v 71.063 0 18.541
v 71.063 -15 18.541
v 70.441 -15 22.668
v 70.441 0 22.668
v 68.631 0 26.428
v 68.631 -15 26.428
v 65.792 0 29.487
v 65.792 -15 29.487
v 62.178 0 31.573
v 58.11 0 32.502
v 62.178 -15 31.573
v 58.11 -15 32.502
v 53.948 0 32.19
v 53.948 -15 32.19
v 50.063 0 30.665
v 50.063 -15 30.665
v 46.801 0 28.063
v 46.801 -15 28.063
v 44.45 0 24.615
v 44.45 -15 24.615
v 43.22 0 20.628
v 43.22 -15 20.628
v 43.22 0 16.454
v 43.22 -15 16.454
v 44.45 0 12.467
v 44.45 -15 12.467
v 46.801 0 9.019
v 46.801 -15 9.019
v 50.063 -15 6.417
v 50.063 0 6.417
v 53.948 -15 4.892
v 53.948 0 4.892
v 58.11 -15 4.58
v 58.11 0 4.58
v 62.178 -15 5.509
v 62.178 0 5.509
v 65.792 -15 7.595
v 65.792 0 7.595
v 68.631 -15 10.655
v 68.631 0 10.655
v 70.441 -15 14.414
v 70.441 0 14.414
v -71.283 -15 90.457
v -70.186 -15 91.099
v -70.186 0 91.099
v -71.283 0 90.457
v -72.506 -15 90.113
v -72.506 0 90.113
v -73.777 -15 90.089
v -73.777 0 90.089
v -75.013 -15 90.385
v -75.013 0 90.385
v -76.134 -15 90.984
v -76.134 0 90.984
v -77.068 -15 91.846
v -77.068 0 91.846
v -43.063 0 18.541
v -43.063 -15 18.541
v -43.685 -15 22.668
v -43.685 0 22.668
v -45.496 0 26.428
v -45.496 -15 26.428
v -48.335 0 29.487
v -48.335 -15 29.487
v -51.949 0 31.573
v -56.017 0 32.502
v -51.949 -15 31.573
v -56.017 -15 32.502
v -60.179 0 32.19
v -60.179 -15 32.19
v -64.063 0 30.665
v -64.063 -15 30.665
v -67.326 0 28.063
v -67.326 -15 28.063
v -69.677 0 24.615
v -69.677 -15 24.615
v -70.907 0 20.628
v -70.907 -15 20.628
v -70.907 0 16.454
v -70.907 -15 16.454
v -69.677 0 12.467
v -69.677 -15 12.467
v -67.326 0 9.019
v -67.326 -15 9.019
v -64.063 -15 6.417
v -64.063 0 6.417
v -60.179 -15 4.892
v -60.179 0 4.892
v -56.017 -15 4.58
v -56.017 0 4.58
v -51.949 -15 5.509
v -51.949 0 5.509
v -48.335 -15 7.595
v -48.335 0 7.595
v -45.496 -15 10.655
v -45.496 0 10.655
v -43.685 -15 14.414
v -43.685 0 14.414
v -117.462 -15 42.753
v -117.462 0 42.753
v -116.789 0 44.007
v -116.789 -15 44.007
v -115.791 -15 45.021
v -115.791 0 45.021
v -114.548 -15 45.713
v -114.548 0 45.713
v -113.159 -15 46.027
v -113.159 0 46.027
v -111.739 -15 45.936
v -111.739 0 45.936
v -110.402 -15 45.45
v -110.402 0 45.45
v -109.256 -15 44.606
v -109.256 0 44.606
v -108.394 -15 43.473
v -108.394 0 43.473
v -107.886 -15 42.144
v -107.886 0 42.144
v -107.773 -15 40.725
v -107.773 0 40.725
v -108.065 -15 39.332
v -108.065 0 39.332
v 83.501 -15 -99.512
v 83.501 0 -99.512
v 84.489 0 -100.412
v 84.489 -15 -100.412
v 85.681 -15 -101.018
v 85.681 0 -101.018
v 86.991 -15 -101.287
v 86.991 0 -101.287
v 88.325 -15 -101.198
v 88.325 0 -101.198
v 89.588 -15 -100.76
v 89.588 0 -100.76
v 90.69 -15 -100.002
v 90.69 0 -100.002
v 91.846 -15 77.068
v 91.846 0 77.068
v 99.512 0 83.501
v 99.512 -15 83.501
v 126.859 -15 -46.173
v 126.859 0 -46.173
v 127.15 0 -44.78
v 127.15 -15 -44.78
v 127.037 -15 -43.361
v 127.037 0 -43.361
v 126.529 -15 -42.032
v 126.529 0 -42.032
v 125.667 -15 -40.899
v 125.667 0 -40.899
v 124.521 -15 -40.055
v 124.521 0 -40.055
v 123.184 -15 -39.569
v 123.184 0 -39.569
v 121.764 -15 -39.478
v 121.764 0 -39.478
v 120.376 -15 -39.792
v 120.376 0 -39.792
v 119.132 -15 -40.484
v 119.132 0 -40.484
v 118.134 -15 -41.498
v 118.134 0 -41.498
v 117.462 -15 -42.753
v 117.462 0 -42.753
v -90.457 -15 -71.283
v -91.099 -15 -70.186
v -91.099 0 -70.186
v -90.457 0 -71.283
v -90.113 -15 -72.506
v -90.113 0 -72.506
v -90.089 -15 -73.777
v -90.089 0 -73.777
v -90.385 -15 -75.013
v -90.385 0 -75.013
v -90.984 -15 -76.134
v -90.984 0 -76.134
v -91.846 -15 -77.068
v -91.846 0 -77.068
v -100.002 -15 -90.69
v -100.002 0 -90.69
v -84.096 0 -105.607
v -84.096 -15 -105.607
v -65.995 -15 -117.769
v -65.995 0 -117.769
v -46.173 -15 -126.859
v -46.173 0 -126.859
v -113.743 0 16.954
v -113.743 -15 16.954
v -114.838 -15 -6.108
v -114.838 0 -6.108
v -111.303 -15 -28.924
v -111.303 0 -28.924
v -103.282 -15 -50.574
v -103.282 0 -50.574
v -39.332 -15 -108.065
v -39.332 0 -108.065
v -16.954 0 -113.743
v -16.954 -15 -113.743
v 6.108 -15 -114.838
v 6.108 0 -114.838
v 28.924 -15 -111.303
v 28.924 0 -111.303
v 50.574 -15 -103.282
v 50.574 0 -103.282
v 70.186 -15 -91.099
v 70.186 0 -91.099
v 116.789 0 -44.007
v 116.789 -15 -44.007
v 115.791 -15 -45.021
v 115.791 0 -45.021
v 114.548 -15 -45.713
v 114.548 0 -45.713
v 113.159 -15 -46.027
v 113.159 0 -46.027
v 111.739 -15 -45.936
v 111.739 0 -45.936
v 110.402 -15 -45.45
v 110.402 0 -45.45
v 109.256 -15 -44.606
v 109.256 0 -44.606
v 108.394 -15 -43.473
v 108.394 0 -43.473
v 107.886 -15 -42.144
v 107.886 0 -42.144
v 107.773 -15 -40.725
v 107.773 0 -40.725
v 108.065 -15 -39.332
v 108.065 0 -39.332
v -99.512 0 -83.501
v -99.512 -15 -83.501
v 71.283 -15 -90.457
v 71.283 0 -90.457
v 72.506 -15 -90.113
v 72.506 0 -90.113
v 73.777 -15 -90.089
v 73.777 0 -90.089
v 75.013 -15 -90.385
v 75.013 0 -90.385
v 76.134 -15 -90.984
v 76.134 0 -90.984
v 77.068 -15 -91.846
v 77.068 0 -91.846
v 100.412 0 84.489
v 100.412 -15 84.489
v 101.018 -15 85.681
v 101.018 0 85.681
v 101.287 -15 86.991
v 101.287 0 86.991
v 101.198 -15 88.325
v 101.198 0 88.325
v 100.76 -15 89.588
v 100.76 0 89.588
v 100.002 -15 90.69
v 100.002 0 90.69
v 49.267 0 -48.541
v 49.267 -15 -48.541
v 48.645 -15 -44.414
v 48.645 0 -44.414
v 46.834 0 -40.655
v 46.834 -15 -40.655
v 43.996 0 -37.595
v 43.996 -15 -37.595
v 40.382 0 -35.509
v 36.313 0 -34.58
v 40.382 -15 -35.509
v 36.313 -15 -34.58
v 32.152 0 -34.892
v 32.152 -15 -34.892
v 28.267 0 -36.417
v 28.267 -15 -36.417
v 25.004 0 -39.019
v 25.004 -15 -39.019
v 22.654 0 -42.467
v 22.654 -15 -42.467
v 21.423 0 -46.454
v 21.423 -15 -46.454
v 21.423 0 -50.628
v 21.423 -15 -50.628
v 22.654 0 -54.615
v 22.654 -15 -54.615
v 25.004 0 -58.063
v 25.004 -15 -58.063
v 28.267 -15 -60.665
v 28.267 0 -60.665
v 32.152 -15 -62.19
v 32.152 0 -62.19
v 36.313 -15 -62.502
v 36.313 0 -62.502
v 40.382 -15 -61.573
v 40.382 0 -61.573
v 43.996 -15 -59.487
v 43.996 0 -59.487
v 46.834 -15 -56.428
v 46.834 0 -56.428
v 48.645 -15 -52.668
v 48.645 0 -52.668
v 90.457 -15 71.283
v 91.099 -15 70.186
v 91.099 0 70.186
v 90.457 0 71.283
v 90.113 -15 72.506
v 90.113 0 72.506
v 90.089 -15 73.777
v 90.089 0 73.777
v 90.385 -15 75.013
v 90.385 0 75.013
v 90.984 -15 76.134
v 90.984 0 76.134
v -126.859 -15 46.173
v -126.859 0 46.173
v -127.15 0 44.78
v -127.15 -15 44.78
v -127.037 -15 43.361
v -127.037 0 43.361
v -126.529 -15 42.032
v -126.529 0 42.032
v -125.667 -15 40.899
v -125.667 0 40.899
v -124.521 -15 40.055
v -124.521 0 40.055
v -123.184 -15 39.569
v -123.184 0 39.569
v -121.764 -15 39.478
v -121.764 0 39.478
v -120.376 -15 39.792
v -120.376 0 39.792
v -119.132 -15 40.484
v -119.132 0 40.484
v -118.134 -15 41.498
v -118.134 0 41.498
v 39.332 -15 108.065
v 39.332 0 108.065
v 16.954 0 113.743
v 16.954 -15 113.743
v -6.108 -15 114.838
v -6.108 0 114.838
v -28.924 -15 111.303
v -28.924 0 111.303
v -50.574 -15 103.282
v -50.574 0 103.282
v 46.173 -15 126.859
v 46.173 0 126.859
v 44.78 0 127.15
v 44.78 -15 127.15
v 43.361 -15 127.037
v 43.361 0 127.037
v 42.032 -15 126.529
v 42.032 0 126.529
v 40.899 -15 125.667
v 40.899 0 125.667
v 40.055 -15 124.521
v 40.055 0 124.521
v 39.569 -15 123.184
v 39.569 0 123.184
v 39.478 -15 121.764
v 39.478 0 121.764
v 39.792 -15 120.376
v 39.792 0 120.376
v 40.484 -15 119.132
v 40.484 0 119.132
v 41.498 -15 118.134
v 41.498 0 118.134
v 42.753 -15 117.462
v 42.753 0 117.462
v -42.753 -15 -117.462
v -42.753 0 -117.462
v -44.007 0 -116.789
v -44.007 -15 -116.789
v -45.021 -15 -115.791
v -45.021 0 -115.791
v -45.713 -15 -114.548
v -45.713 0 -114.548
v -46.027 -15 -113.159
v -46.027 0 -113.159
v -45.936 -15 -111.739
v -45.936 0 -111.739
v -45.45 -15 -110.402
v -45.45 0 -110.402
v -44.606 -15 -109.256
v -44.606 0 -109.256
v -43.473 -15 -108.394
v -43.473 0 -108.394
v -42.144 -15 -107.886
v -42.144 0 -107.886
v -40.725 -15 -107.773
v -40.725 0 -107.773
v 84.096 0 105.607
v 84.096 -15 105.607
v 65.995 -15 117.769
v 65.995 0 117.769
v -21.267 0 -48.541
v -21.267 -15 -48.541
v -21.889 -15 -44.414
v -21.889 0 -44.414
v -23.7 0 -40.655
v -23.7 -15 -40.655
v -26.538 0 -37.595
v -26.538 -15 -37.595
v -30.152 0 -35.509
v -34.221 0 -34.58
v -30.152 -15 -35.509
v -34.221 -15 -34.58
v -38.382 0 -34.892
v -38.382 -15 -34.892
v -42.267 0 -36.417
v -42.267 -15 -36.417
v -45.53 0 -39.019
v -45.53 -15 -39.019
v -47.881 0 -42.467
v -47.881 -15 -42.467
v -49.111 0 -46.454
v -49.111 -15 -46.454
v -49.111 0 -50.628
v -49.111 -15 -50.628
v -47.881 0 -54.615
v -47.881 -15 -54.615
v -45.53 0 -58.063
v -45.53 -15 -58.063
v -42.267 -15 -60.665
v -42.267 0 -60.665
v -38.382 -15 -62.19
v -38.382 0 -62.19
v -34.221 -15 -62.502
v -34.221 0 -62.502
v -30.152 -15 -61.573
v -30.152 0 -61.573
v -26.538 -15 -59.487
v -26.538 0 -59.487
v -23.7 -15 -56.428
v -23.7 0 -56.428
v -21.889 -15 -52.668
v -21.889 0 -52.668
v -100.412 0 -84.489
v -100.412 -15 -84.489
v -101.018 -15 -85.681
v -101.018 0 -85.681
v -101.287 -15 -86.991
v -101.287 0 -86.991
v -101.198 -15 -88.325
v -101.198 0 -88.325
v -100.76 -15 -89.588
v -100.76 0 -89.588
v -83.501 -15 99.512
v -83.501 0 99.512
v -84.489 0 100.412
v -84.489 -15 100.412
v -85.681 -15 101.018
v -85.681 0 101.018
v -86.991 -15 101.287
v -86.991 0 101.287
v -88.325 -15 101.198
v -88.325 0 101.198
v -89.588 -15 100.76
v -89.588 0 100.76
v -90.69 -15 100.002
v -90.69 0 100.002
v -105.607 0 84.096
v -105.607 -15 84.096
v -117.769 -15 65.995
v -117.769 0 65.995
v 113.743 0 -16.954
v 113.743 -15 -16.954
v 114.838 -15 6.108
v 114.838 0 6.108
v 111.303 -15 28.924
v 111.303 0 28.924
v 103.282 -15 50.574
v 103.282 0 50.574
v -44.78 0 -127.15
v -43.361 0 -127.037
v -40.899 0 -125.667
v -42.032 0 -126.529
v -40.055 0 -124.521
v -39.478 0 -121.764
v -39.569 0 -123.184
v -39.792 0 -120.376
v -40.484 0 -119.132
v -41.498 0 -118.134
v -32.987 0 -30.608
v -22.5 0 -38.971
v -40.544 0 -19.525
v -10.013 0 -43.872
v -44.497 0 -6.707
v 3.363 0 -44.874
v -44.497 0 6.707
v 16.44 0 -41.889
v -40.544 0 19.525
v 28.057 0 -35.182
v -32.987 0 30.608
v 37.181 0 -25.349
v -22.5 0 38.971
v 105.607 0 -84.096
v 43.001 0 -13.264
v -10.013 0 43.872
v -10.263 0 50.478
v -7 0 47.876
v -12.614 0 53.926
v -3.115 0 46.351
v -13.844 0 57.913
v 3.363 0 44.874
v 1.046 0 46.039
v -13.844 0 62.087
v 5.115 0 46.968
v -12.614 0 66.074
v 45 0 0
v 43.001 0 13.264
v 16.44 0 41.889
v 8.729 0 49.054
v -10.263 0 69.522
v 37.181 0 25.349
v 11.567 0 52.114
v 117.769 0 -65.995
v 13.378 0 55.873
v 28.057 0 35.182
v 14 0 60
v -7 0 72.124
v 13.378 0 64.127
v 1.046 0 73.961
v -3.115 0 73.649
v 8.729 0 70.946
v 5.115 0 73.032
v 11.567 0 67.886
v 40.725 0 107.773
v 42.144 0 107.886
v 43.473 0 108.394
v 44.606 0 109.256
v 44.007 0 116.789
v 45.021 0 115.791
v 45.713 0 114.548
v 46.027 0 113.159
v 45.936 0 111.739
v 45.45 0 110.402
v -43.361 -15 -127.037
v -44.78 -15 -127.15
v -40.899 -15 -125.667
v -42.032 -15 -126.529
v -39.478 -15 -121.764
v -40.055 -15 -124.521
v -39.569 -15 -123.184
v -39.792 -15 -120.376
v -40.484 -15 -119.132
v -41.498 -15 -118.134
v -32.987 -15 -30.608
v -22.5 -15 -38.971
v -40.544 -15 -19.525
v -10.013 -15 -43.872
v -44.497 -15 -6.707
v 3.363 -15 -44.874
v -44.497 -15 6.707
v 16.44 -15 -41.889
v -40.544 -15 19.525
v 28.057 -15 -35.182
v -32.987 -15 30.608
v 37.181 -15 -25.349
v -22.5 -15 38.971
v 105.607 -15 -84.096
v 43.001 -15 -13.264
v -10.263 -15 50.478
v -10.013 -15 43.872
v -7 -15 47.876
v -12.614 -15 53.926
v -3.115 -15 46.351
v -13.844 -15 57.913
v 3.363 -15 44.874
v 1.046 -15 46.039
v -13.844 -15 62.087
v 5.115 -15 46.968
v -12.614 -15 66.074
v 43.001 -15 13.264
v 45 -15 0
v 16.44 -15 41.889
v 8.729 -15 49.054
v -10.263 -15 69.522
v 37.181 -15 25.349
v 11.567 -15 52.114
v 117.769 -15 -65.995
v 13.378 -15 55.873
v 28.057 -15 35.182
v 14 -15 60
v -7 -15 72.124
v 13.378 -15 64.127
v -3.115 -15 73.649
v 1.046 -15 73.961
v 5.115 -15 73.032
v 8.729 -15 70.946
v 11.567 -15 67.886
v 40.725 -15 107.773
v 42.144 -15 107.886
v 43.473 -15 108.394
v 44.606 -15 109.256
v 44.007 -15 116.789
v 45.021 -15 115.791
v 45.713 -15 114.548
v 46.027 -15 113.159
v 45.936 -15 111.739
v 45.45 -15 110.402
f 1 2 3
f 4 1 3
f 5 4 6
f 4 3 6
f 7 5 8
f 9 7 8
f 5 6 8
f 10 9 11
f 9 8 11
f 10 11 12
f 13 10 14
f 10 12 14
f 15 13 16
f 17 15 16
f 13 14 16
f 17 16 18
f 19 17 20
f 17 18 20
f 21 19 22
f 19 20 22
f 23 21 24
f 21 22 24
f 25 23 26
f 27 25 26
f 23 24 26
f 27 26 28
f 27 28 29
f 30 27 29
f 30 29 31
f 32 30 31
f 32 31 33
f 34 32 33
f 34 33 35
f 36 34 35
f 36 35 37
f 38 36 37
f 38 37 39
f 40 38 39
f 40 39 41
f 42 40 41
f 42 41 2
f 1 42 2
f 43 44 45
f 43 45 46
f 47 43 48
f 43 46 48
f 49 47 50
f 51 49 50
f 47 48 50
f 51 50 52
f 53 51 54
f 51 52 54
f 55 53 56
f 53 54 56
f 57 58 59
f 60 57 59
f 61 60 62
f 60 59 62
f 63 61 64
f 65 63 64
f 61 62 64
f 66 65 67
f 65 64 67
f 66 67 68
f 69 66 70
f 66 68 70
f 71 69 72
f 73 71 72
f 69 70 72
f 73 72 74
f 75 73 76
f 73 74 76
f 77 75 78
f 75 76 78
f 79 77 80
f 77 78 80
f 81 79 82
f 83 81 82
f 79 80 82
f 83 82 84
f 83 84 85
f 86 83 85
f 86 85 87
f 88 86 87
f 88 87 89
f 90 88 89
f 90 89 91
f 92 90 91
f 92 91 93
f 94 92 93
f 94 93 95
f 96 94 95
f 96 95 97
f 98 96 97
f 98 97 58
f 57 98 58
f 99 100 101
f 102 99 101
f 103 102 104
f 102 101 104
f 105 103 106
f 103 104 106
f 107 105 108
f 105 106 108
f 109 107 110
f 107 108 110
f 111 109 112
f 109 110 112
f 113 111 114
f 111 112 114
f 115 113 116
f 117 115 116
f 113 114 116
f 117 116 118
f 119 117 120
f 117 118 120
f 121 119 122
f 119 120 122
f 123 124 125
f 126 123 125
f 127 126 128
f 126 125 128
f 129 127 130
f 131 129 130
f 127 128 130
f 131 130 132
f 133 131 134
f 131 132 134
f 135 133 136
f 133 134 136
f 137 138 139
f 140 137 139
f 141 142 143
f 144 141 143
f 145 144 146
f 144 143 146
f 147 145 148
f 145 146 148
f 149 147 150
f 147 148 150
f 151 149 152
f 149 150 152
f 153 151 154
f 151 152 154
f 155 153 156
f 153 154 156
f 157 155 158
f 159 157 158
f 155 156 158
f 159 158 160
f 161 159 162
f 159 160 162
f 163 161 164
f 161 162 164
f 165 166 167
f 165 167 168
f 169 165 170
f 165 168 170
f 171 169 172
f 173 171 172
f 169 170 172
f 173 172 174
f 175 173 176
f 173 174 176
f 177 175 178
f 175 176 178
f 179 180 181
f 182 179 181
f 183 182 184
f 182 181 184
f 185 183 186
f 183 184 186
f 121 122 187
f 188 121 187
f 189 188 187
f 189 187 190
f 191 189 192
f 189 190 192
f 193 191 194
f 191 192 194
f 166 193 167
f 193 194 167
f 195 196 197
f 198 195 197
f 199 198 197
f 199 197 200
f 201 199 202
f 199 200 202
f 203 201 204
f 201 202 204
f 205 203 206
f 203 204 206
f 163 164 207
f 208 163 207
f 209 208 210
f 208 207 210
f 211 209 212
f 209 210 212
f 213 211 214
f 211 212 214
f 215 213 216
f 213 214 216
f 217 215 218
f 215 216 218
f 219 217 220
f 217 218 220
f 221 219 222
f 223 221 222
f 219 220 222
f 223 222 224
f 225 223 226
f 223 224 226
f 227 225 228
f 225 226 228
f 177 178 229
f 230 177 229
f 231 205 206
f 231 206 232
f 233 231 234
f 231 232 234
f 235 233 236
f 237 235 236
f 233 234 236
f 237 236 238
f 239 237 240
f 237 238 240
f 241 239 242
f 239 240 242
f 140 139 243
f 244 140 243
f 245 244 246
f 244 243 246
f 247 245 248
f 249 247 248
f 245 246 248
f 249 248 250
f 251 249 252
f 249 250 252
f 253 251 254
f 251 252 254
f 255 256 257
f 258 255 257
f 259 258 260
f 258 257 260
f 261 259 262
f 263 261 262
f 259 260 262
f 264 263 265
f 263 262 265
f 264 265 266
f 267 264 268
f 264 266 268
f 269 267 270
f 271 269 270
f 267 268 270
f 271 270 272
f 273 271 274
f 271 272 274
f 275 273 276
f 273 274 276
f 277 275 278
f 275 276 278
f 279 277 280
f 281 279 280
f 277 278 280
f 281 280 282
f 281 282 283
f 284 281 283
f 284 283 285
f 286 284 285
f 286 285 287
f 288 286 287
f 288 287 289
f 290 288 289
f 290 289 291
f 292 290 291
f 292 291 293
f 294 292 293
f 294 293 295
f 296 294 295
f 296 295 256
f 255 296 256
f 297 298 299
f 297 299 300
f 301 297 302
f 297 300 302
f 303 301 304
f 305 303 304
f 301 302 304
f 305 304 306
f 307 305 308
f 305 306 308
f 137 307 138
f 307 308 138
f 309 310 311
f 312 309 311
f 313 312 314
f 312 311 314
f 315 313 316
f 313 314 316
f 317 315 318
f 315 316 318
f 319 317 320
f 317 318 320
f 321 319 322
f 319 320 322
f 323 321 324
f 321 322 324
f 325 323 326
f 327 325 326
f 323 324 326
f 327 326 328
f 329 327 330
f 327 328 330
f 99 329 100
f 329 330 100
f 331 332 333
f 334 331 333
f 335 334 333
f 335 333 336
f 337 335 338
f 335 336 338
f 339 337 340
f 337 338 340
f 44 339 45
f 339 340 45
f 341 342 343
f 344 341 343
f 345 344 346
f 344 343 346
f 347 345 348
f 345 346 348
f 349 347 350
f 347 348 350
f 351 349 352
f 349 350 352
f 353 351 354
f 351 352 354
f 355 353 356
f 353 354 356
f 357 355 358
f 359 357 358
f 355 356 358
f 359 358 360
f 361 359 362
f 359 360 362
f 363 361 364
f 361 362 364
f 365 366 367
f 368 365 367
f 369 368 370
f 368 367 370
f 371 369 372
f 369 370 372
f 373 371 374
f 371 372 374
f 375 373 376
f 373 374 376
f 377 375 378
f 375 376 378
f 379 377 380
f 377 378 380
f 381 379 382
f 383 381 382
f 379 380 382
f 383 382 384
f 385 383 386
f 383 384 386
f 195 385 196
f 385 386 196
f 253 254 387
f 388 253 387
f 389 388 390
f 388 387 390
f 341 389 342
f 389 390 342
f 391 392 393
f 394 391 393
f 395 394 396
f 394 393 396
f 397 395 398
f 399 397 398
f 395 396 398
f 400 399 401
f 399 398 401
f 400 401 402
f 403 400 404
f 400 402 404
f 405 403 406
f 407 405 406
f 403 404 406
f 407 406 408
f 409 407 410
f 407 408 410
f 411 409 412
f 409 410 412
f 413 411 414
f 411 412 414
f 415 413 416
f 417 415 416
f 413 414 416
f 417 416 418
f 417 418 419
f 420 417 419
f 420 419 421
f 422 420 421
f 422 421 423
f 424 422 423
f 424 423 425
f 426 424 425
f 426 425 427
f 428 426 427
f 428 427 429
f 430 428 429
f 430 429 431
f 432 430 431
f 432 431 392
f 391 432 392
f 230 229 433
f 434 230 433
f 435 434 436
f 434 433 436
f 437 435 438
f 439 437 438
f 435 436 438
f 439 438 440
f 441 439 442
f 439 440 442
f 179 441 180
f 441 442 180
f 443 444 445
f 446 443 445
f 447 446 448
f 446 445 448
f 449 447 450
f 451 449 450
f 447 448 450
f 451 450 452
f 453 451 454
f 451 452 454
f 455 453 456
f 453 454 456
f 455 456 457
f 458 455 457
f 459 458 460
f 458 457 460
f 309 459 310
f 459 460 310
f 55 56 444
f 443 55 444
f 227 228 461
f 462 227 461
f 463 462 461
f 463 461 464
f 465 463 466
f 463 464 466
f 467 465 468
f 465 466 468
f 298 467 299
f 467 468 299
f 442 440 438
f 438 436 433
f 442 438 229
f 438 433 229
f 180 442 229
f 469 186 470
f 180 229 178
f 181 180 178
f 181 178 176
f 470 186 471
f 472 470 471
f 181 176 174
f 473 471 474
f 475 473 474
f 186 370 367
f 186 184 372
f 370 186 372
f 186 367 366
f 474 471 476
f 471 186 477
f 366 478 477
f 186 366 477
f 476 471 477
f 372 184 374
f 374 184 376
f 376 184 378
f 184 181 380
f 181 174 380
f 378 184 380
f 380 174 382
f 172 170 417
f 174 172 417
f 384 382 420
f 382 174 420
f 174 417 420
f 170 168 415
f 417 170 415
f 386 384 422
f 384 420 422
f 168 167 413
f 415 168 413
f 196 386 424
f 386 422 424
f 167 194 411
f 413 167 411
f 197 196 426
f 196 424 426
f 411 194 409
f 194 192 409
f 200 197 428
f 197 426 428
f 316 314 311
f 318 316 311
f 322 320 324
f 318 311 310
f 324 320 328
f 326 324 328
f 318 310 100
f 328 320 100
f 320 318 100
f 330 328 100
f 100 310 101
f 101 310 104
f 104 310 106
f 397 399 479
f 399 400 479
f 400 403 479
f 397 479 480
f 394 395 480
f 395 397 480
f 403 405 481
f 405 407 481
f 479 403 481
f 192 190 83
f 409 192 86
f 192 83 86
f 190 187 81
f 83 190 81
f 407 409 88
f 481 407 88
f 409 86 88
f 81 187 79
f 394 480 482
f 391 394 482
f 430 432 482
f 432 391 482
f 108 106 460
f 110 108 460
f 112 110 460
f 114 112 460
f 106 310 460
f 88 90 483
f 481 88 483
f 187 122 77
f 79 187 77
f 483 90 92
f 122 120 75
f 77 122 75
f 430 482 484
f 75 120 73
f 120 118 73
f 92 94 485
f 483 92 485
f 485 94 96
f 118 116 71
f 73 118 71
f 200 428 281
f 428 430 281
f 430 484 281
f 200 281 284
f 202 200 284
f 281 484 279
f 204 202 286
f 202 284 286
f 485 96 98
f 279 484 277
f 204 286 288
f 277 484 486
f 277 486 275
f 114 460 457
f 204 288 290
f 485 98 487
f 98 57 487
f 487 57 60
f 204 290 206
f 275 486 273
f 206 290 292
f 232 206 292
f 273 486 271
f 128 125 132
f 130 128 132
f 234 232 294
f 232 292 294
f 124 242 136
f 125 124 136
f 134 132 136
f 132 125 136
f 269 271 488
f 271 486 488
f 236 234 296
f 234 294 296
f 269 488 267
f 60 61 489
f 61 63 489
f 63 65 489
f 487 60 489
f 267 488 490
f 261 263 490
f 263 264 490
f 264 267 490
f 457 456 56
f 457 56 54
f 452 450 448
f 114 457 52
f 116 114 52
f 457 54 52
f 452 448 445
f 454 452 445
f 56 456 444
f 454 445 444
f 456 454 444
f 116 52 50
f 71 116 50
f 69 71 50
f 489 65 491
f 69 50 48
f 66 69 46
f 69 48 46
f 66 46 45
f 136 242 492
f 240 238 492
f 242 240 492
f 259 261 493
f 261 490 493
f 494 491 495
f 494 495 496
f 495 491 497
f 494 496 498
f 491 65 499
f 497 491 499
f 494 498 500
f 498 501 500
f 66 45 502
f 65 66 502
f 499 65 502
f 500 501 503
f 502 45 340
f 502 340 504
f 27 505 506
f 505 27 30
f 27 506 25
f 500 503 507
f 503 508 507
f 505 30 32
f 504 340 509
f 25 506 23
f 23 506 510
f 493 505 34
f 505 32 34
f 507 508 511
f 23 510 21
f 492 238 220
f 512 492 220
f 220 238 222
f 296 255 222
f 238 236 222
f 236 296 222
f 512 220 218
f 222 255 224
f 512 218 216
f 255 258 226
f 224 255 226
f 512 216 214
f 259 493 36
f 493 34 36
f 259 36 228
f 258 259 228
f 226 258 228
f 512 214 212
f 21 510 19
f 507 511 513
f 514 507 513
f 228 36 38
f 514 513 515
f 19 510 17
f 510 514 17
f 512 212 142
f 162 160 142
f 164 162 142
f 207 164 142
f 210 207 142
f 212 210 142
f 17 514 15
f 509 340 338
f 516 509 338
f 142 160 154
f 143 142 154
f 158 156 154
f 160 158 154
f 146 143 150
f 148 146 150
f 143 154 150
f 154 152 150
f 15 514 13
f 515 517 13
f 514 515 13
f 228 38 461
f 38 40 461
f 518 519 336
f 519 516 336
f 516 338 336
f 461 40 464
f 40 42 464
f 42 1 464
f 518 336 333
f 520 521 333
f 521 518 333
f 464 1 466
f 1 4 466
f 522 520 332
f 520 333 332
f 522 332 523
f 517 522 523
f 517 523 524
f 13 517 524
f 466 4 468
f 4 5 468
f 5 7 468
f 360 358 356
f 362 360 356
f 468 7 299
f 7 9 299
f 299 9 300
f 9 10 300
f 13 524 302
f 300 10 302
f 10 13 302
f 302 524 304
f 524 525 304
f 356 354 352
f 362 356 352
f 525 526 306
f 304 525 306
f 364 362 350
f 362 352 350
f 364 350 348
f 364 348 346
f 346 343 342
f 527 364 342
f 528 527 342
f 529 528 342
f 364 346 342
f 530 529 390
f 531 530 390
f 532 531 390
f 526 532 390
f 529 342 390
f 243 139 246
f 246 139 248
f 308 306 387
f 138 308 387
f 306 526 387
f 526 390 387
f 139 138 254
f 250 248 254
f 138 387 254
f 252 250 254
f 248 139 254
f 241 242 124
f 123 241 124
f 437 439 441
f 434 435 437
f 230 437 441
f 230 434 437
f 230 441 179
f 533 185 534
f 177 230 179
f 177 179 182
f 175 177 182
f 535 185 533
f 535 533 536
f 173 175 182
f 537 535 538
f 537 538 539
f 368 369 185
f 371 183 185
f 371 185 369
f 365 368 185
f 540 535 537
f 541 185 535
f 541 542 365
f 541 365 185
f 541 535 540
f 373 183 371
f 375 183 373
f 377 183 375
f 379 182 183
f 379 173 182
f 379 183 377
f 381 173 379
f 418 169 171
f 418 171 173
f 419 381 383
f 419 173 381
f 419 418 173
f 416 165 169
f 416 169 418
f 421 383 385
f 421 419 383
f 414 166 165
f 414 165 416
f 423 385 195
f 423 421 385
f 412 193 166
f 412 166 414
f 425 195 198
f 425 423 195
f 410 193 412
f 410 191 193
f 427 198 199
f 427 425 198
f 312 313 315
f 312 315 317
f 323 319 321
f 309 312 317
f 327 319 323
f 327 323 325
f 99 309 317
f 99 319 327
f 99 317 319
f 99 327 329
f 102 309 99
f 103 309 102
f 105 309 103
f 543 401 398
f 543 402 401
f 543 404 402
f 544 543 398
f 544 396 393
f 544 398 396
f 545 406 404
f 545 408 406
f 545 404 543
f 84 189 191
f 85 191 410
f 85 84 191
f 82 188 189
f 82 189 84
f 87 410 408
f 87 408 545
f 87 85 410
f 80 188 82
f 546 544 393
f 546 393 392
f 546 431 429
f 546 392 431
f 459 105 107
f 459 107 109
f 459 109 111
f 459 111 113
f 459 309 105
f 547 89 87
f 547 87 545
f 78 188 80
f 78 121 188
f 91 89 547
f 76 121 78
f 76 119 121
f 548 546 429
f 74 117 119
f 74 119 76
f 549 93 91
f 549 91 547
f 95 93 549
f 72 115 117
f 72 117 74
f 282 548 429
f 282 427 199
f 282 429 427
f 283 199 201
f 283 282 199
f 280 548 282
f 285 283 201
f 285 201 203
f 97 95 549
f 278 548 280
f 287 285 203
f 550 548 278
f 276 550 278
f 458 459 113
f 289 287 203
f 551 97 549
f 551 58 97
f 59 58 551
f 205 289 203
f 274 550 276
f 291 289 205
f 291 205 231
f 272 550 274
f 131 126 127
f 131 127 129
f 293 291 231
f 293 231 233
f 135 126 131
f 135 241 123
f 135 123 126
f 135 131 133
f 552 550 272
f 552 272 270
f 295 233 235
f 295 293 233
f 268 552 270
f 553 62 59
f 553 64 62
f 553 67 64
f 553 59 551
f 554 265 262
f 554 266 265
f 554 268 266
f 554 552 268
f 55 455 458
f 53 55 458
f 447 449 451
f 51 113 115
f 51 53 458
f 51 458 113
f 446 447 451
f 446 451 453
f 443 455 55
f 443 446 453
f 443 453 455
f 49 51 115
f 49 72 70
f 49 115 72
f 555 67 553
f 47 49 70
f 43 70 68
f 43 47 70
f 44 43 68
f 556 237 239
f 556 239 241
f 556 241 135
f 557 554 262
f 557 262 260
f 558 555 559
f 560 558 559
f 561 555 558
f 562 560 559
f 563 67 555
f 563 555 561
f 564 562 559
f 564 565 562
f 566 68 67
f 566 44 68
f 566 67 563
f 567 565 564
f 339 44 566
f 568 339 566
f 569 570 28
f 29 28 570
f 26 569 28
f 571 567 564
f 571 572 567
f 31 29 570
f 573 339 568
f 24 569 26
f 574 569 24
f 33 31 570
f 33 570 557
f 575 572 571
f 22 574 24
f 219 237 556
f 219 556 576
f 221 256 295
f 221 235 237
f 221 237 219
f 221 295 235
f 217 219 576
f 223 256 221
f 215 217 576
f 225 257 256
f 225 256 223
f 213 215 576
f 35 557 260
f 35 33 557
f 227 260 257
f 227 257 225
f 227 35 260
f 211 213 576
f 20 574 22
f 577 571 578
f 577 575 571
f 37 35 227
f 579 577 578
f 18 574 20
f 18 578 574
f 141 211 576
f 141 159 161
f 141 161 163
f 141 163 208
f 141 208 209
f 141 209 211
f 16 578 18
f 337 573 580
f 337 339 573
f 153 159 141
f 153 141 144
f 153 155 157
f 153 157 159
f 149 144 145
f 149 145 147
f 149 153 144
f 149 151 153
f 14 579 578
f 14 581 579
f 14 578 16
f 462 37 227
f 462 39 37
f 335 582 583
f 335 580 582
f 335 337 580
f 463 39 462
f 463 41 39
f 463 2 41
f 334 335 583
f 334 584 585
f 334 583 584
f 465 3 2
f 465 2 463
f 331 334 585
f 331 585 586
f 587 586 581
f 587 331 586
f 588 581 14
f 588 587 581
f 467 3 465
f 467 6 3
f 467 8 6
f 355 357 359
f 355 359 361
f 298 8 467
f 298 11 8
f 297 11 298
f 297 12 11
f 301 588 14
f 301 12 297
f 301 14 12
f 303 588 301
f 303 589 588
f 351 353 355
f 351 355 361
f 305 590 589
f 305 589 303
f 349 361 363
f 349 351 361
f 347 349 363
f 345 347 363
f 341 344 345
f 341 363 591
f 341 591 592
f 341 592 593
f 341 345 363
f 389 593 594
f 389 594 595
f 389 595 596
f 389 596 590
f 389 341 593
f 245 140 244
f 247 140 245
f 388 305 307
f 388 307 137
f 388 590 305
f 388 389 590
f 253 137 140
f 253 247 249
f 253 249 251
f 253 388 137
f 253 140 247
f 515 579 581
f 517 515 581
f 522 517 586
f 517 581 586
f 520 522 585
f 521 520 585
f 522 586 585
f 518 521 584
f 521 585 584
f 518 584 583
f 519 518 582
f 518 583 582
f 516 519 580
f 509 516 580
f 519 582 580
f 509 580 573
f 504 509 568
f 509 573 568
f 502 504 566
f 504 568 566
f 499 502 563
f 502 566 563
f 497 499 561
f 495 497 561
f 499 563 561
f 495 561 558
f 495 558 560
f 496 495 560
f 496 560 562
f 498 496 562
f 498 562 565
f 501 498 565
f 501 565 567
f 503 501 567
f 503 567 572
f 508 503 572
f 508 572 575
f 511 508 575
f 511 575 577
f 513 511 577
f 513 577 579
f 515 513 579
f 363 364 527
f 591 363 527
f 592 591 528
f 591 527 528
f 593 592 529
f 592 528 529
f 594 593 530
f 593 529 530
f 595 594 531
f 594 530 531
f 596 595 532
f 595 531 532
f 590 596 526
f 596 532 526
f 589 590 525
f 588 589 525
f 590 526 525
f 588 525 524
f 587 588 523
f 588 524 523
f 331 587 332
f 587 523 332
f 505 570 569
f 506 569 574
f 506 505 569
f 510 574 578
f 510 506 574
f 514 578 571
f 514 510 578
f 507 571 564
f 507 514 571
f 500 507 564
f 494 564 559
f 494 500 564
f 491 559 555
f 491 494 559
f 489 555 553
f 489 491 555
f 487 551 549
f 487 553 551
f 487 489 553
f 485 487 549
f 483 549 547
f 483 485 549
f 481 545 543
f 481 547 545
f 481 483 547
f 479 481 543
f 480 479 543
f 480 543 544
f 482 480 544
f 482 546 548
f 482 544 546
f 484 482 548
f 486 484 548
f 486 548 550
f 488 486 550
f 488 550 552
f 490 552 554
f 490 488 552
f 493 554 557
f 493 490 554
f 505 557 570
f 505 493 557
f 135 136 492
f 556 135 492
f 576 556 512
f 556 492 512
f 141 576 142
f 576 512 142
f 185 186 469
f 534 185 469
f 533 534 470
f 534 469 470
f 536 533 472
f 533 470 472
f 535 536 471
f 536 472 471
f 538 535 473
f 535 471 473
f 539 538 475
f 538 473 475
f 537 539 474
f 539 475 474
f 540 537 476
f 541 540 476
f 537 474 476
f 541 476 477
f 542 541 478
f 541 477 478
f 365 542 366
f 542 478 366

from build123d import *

# Parameters (mm, degrees)
F0_R     = 14
F0_R_2   = 45
F1_DEPTH = 15
F3_COUNT = 4
F4_R     = 14
F5_DEPTH = 15.001


# Not quite as in the source:
# - a feature names something its author has since deleted; it is built from what else it names


with BuildPart() as f1:
    # F0 (on Front) → F1 (new body)
    with BuildSketch(Plane.XZ):
        with BuildLine():
            ThreePointArc((-117.4615775982, 42.7525179157), (-111.0530137777, 45.740880303), (-108.0646513904, 39.3323164825))
            ThreePointArc((-108.0646513904, 39.3323164825), (-113.6444232454, -17.6052567496), (-91.0986302517, -70.1857504502))
            ThreePointArc((-91.0986302517, -70.1857504502), (-90.0886289945, -73.7767817278), (-91.8455022142, -77.0675270332))
            Line((-91.8455022142, -77.0675270332), (-99.5120922253, -83.500559884))
            ThreePointArc((-99.5120922253, -83.500559884), (-101.2865881138, -86.990889679), (-100.0019293376, -90.6896583342))
            ThreePointArc((-100.0019293376, -90.6896583342), (-75.2914558589, -112.0544362114), (-46.172719349, -126.8585038061))
            ThreePointArc((-46.172719349, -126.8585038061), (-39.7641555284, -123.8701414188), (-42.7525179157, -117.4615775982))
            ThreePointArc((-42.7525179157, -117.4615775982), (-45.740880303, -111.0530137777), (-39.3323164825, -108.0646513904))
            ThreePointArc((-39.3323164825, -108.0646513904), (17.6052567496, -113.6444232454), (70.1857504502, -91.0986302517))
            ThreePointArc((70.1857504502, -91.0986302517), (73.7767817278, -90.0886289945), (77.0675270332, -91.8455022142))
            Line((77.0675270332, -91.8455022142), (83.500559884, -99.5120922253))
            ThreePointArc((83.500559884, -99.5120922253), (86.990889679, -101.2865881138), (90.6896583342, -100.0019293376))
            ThreePointArc((90.6896583342, -100.0019293376), (112.0544362114, -75.2914558589), (126.8585038061, -46.172719349))
            ThreePointArc((126.8585038061, -46.172719349), (123.8701414188, -39.7641555284), (117.4615775982, -42.7525179157))
            ThreePointArc((117.4615775982, -42.7525179157), (111.0530137777, -45.740880303), (108.0646513904, -39.3323164825))
            ThreePointArc((108.0646513904, -39.3323164825), (113.6444232454, 17.6052567496), (91.0986302517, 70.1857504502))
            ThreePointArc((91.0986302517, 70.1857504502), (90.0886289945, 73.7767817278), (91.8455022142, 77.0675270332))
            Line((91.8455022142, 77.0675270332), (99.5120922253, 83.500559884))
            ThreePointArc((99.5120922253, 83.500559884), (101.2865881138, 86.990889679), (100.0019293376, 90.6896583342))
            ThreePointArc((100.0019293376, 90.6896583342), (75.2914558589, 112.0544362114), (46.172719349, 126.8585038061))
            ThreePointArc((46.172719349, 126.8585038061), (39.7641555284, 123.8701414188), (42.7525179157, 117.4615775982))
            ThreePointArc((42.7525179157, 117.4615775982), (45.740880303, 111.0530137777), (39.3323164825, 108.0646513904))
            ThreePointArc((39.3323164825, 108.0646513904), (-17.6052567496, 113.6444232454), (-70.1857504502, 91.0986302517))
            ThreePointArc((-70.1857504502, 91.0986302517), (-73.7767817278, 90.0886289945), (-77.0675270332, 91.8455022142))
            Line((-77.0675270332, 91.8455022142), (-83.500559884, 99.5120922253))
            ThreePointArc((-83.500559884, 99.5120922253), (-86.990889679, 101.2865881138), (-90.6896583342, 100.0019293376))
            ThreePointArc((-90.6896583342, 100.0019293376), (-112.0544362114, 75.2914558589), (-126.8585038061, 46.172719349))
            ThreePointArc((-126.8585038061, 46.172719349), (-123.8701414188, 39.7641555284), (-117.4615775982, 42.7525179157))
        make_face()
        with Locations((-35.2671151375, -48.5410196625)):
            Circle(F0_R, mode=Mode.SUBTRACT)
        with Locations((35.2671151375, -48.5410196625)):
            Circle(F0_R, mode=Mode.SUBTRACT)
        with Locations((-57.0633909777, 18.5410196625)):
            Circle(F0_R, mode=Mode.SUBTRACT)
        Circle(F0_R_2, mode=Mode.SUBTRACT)
        with Locations((57.0633909777, 18.5410196625)):
            Circle(F0_R, mode=Mode.SUBTRACT)
        with Locations((0, 60)):
            Circle(F0_R, mode=Mode.SUBTRACT)
    extrude(amount=F1_DEPTH)

    # F3: F1 ×4 about axis
    f3_axis = Axis((0, -15, 0), (0, -1, 0))


with BuildPart() as f1_1:
    add(f1.part)
    for i in range(1, F3_COUNT):
        add(f1.part.rotate(f3_axis, i * 360 / F3_COUNT))

    # F4 (on face) → F5 (cut, through all)
    with BuildSketch(Plane.XZ.offset(15)):
        with Locations((0, 60)):
            Circle(F4_R)
        with Locations((-57.0633909777, 18.5410196625)):
            Circle(F4_R)
        with Locations((-35.2671151375, -48.5410196625)):
            Circle(F4_R)
        with Locations((35.2671151375, -48.5410196625)):
            Circle(F4_R)
        with Locations((57.0633909777, 18.5410196625)):
            Circle(F4_R)
    extrude(amount=-F5_DEPTH, mode=Mode.SUBTRACT)


solid = f1_1.part
